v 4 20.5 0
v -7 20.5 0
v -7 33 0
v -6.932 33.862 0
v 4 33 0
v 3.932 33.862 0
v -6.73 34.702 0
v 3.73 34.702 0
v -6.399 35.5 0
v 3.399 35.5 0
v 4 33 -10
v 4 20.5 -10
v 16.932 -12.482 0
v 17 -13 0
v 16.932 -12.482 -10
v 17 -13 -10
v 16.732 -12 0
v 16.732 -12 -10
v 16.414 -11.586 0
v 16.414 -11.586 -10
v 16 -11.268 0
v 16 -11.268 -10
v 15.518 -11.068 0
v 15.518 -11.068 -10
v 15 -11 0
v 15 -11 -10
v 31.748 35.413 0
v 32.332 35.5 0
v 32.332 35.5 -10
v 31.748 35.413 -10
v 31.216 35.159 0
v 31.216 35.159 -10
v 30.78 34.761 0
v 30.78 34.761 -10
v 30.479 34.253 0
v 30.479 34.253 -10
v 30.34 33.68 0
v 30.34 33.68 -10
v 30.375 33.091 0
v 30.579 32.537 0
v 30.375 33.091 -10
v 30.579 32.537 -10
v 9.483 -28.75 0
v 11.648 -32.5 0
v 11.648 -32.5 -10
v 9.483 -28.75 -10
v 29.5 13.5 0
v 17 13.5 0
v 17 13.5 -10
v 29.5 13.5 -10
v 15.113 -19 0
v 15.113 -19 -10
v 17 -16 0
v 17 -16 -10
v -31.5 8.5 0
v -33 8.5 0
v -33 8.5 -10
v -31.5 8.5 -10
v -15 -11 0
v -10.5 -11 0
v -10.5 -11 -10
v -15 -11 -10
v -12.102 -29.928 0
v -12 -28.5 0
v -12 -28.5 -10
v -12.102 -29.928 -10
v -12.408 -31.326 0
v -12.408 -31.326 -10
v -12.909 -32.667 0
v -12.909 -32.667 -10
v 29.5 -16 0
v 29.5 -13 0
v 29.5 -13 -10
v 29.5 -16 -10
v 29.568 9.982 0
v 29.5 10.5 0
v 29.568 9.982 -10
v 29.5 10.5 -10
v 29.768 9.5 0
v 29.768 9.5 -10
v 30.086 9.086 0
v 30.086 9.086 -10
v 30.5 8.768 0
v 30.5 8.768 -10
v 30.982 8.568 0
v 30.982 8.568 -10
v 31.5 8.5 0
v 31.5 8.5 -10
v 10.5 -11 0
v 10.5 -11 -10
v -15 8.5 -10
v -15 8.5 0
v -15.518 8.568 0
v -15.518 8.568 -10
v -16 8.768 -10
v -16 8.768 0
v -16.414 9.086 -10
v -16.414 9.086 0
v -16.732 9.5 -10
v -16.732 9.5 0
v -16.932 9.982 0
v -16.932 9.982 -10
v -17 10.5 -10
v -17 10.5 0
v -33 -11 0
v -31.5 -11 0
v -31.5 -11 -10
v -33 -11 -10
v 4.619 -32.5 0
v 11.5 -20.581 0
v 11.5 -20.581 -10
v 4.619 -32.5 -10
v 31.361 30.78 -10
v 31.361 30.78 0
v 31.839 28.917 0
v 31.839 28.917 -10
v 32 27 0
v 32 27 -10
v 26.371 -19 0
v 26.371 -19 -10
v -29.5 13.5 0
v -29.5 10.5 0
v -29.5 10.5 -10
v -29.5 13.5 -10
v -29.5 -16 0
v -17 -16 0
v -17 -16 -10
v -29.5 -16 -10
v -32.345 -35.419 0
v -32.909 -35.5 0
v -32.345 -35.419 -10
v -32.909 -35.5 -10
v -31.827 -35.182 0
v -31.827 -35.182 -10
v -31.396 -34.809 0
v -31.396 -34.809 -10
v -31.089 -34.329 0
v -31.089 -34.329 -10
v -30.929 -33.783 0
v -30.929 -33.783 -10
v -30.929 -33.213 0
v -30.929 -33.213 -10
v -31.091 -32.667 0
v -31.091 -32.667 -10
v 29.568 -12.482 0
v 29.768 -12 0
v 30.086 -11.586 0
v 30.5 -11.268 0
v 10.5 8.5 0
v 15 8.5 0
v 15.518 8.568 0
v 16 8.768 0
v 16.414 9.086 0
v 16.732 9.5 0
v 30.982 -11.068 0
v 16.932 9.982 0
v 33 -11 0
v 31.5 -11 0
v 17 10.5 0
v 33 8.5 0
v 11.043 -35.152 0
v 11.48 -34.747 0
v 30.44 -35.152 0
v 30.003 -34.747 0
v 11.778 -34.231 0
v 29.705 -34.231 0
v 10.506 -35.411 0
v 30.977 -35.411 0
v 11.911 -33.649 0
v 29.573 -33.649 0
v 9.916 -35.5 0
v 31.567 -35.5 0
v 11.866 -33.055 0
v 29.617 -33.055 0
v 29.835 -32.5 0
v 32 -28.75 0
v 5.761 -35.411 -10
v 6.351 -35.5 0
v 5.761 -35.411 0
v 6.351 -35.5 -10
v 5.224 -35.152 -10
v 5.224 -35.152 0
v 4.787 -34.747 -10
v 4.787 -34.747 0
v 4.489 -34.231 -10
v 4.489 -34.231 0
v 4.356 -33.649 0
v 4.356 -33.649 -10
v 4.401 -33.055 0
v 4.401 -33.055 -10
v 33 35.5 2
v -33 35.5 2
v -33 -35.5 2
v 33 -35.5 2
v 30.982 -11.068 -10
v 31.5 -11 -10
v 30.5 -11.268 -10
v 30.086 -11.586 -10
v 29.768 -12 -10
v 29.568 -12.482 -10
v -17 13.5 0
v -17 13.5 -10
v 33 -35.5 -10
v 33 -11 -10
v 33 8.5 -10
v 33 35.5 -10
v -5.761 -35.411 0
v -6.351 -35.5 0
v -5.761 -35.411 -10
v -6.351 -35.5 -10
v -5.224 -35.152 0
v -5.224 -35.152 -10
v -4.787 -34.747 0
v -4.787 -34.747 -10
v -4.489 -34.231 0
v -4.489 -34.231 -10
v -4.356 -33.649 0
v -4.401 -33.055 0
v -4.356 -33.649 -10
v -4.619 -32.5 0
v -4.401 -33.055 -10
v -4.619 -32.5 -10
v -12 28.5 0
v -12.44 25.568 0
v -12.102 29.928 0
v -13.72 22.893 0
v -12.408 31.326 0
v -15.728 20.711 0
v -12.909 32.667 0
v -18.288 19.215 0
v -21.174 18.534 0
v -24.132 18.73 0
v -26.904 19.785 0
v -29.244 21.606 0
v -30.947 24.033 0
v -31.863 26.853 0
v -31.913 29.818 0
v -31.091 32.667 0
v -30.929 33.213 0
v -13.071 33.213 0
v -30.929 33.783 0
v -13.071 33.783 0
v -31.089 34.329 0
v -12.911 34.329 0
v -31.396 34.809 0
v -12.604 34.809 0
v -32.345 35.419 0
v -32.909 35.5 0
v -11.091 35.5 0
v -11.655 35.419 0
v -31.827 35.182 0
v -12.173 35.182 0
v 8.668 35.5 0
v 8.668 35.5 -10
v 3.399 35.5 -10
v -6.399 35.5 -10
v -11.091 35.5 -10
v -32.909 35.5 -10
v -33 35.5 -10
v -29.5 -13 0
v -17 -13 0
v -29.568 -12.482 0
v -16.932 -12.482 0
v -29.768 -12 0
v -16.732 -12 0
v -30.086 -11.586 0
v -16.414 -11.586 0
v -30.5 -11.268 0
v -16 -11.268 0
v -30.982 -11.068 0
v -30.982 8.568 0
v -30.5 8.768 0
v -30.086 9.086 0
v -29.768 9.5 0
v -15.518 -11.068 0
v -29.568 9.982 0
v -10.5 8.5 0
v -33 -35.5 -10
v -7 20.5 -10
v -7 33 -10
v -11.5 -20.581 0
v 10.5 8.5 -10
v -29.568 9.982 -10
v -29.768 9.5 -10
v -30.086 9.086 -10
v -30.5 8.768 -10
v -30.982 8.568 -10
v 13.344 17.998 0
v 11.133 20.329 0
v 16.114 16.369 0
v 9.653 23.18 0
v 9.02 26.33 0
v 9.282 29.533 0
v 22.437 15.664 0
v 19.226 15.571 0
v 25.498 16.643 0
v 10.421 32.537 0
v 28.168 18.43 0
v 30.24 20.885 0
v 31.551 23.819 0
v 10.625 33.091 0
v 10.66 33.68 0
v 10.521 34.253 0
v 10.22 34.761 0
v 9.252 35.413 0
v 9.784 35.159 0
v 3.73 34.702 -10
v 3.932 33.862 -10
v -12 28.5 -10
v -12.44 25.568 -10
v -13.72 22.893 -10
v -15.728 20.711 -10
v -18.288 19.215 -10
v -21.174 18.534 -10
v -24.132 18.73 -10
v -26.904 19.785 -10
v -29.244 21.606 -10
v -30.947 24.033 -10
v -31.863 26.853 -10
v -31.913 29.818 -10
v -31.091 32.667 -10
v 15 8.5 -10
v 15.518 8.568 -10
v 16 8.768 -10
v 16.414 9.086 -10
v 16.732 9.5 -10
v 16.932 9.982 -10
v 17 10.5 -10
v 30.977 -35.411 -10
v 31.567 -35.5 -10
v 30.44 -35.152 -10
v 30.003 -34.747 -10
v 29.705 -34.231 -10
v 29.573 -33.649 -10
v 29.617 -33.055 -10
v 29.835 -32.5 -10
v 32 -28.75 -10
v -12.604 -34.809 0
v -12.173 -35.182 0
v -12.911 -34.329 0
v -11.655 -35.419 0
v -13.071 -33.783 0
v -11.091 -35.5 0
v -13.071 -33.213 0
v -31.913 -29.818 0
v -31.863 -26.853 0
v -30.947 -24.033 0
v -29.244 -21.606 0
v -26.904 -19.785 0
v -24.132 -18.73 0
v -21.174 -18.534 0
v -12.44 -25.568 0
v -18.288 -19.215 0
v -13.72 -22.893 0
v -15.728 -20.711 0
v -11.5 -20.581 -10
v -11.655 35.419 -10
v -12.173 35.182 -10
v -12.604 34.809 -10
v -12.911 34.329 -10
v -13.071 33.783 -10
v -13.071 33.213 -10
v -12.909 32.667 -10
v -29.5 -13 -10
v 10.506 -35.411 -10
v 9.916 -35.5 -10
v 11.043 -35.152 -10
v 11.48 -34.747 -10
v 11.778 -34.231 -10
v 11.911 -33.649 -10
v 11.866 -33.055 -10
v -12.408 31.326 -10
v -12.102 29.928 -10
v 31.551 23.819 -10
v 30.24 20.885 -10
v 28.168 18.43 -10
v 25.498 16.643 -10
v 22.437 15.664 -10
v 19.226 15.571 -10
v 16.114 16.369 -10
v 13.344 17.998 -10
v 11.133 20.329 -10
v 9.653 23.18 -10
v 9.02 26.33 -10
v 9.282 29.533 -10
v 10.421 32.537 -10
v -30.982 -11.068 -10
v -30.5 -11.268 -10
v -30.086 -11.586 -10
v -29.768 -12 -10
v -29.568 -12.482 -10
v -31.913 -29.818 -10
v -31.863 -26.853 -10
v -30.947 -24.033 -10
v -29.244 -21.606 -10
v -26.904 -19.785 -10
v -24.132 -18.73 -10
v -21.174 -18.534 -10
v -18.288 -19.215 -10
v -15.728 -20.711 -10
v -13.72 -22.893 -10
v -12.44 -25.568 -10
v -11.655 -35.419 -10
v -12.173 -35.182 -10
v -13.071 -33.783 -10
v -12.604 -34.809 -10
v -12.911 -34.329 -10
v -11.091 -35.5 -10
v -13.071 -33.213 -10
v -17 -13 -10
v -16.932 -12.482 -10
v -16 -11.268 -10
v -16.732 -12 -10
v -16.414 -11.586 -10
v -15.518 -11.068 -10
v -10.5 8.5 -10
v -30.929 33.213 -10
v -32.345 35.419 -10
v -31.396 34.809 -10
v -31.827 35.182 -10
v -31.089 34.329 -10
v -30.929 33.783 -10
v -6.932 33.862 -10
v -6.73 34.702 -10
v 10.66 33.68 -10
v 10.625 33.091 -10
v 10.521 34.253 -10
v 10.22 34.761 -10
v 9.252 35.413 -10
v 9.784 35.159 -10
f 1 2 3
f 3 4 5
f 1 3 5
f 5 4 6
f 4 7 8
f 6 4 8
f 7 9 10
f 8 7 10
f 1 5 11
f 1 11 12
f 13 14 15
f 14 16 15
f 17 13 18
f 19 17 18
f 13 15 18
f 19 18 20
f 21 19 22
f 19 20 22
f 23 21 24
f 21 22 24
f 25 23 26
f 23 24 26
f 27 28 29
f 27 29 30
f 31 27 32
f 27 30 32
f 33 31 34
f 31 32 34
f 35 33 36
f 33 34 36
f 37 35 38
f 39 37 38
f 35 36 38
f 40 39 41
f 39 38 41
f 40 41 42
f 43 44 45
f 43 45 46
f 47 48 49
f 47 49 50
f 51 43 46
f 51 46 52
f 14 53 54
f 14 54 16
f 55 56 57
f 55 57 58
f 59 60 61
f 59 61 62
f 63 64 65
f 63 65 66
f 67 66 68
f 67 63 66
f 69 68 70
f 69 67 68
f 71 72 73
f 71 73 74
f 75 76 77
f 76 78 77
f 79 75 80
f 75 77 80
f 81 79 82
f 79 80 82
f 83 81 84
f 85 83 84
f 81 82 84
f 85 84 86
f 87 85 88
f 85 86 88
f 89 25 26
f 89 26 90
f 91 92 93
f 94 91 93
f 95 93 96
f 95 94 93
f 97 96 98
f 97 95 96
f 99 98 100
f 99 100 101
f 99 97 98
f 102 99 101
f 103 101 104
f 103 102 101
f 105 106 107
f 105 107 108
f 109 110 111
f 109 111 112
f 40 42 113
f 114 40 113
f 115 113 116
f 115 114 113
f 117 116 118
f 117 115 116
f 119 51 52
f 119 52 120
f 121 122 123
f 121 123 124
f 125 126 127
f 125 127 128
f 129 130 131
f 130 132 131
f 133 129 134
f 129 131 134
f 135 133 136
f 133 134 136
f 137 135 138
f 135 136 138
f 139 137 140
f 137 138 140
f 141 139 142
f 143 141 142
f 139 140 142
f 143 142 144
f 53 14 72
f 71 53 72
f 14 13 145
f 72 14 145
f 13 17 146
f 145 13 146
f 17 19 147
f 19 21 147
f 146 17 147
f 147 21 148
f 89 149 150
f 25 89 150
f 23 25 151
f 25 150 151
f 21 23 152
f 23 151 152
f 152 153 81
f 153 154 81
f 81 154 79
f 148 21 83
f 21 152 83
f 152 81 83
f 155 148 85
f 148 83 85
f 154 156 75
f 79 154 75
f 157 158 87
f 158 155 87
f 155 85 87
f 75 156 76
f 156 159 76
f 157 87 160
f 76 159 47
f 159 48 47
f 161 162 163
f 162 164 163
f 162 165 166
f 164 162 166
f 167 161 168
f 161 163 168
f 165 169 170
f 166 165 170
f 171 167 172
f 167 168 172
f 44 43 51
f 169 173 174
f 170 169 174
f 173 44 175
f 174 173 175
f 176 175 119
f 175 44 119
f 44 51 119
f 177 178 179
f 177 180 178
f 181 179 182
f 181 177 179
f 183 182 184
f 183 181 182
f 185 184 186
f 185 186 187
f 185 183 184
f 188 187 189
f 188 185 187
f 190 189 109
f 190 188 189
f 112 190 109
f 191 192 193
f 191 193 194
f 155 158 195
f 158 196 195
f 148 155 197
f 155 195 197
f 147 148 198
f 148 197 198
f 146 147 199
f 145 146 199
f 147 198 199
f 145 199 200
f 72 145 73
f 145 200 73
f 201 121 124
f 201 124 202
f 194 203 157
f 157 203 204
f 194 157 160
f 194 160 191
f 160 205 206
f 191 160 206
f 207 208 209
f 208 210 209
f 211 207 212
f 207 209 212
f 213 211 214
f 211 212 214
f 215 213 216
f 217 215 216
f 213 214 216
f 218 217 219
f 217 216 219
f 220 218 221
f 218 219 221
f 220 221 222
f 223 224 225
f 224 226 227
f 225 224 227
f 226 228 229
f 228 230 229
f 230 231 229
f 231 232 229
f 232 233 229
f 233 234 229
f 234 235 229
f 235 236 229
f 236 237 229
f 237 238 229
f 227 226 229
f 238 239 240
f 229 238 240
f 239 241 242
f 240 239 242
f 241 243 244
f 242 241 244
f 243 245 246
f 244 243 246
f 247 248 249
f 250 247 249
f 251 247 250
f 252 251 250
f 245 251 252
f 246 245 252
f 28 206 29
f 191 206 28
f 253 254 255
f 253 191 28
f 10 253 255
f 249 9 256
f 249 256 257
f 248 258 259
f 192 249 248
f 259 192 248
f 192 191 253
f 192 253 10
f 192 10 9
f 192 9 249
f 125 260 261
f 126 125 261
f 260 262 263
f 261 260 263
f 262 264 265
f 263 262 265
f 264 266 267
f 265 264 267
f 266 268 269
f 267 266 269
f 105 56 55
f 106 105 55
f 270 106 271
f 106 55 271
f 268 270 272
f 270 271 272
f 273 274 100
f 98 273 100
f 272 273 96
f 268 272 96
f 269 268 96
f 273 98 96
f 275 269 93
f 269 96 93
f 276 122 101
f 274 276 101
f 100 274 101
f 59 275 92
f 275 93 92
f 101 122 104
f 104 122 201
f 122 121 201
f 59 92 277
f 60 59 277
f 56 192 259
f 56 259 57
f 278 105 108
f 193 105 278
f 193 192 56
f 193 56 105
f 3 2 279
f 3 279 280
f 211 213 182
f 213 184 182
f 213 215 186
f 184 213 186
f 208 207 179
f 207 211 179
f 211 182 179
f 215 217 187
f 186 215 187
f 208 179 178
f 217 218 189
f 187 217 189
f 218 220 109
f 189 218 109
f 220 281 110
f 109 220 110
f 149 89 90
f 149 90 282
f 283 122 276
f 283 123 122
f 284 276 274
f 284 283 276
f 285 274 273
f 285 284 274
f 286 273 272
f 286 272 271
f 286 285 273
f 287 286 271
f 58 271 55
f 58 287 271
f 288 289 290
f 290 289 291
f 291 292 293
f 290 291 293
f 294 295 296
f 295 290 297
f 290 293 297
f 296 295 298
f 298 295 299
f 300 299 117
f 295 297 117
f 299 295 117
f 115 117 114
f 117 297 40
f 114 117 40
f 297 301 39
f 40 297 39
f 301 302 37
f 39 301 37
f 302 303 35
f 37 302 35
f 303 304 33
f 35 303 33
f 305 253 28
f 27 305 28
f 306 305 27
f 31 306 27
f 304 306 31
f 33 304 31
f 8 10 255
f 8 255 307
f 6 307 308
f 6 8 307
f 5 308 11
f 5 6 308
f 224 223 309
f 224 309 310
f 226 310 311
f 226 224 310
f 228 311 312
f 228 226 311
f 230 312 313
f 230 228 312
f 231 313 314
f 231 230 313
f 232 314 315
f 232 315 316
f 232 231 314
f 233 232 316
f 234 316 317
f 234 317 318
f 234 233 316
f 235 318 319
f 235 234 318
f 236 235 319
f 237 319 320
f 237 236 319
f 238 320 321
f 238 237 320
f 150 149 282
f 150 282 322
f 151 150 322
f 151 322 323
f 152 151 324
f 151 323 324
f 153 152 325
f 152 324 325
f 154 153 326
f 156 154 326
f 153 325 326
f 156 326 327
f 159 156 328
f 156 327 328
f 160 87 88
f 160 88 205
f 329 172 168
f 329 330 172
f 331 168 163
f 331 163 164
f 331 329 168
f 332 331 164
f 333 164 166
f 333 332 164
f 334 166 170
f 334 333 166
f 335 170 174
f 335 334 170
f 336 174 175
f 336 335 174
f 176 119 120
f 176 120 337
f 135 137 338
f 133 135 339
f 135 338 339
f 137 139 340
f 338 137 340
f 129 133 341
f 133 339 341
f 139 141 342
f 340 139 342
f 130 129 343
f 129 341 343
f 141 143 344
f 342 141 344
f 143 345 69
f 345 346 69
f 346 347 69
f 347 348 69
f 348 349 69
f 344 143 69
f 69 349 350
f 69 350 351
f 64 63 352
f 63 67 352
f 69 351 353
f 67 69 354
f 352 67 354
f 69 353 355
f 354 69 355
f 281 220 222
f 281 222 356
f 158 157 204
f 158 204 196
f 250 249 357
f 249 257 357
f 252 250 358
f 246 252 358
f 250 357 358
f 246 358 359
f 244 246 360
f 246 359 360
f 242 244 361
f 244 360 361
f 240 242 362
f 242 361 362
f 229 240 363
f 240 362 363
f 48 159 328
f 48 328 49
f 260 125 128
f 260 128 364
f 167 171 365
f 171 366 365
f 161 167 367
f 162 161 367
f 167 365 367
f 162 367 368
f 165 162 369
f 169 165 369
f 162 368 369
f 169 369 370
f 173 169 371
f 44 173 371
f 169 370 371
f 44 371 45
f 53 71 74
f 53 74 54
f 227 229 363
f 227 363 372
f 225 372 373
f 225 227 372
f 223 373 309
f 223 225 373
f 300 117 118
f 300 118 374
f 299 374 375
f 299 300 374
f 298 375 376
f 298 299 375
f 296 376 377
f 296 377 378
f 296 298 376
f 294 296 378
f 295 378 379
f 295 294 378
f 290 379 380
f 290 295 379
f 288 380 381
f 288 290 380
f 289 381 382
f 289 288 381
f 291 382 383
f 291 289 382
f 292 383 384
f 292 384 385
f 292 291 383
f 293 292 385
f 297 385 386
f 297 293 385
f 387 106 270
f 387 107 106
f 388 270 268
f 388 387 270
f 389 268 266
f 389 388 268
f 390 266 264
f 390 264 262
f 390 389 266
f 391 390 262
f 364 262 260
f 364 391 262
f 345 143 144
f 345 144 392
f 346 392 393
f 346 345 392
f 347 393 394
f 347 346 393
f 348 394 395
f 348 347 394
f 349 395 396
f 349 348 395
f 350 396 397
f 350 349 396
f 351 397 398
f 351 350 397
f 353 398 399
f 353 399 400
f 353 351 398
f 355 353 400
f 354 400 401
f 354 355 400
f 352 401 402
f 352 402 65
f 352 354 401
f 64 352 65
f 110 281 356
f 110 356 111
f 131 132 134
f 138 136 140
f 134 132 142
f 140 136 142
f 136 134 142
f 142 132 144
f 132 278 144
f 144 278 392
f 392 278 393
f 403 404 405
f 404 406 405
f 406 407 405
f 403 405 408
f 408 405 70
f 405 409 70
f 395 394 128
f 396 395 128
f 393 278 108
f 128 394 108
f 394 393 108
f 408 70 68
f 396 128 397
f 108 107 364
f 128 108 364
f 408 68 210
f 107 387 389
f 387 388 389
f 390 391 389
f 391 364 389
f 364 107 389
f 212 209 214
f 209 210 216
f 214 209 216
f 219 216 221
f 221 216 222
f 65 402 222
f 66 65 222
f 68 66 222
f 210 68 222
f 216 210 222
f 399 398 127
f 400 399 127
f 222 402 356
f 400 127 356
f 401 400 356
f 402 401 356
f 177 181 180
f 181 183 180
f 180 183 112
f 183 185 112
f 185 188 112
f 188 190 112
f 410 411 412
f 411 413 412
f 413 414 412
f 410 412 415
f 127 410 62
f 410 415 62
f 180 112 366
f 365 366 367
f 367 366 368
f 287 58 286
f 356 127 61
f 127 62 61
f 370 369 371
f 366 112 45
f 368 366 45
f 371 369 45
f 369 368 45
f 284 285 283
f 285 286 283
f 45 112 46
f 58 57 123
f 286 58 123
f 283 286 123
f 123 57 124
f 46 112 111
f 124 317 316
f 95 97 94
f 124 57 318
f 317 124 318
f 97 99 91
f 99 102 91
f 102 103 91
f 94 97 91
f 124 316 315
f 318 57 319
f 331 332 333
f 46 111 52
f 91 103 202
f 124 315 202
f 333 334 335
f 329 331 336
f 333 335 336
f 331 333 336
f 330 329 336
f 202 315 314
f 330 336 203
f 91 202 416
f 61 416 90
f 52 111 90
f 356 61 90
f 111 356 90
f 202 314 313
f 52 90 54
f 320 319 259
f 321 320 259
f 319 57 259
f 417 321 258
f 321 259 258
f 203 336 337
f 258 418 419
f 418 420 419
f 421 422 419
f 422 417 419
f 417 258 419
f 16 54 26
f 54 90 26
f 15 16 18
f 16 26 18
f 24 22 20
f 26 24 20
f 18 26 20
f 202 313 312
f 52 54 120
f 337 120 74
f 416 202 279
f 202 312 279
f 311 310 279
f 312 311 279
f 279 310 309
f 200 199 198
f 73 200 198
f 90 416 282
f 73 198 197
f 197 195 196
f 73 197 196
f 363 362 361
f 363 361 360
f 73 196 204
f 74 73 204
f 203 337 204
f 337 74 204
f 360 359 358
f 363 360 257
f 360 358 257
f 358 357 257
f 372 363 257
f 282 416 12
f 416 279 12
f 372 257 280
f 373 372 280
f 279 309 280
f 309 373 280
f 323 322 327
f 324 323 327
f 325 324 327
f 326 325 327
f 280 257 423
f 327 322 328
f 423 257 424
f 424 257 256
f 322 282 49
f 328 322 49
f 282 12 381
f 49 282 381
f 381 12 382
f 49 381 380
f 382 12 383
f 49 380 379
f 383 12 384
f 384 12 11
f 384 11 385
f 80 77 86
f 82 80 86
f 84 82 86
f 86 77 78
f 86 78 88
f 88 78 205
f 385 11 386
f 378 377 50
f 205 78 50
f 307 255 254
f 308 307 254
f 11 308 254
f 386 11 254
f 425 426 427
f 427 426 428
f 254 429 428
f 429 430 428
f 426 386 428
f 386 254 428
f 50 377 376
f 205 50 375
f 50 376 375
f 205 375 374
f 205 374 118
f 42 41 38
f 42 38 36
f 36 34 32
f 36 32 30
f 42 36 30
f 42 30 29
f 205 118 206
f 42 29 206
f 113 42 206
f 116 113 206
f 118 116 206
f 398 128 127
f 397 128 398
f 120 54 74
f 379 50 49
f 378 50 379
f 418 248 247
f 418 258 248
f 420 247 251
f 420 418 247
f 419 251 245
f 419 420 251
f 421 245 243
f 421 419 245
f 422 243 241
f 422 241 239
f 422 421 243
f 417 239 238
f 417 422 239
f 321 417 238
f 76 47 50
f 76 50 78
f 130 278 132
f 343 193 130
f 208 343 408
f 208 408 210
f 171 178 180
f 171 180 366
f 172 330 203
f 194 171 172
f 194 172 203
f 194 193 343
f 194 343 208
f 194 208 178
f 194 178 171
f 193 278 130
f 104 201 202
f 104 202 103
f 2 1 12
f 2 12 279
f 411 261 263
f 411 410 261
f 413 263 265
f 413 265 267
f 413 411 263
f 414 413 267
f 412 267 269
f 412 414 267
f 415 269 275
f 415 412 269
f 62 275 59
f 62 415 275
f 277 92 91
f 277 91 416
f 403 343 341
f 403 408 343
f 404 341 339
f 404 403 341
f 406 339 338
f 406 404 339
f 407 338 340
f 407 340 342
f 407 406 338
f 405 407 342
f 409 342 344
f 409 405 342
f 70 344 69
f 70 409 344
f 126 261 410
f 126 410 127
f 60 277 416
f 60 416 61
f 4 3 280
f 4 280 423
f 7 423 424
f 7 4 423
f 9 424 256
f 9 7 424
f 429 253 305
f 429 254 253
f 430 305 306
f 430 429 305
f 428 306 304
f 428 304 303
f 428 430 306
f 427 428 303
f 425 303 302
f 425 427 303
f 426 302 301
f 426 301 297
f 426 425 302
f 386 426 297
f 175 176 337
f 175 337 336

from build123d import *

# Parameters (mm, degrees)
F1_W     = 6.5
F1_H     = 19.5
F1_W_2   = 12.5
F1_H_2   = 5
F1_W_3   = 3.5
F2_DEPTH = 2
F3_DEPTH = 10
F4_R     = 2


# Not quite as in the source:
# - a feature names something its author has since deleted; it is built from what else it names


with BuildPart() as f2:
    # F1 (on Top) → F2 (new body)
    with BuildSketch(Plane.XY):
        with BuildLine():
            Line((-29.1414284285, 35.5), (-33, 35.5))
            Line((-33, 35.5), (-33, 8.5))
            Line((-33, 8.5), (-29.5, 8.5))
            Line((-29.5, 8.5), (-29.5, 13.5))
            Line((-29.5, 13.5), (-17, 13.5))
            Line((-17, 13.5), (-17, 8.5))
            Line((-17, 8.5), (-10.5, 8.5))
            Line((-10.5, 8.5), (-10.5, -11))
            Line((-10.5, -11), (-17, -11))
            Line((-17, -11), (-17, -16))
            Line((-17, -16), (-29.5, -16))
            Line((-29.5, -16), (-29.5, -11))
            Line((-29.5, -11), (-33, -11))
            Line((-33, -11), (-33, -35.5))
            Line((-33, -35.5), (-29.1414284285, -35.5))
            ThreePointArc((-29.1414284285, -35.5), (-25.7805896177, -19.2421848073), (-12, -28.5))
            ThreePointArc((-12, -28.5), (-12.7421848073, -32.2805896177), (-14.8585715715, -35.5))
            Line((-14.8585715715, -35.5), (-2.8867513459, -35.5))
            Line((-2.8867513459, -35.5), (-11.5, -20.581415713))
            Line((-11.5, -20.581415713), (11.5, -20.581415713))
            Line((11.5, -20.581415713), (2.8867513459, -35.5))
            Line((2.8867513459, -35.5), (13.3804538186, -35.5))
            Line((13.3804538186, -35.5), (9.4833395016, -28.75))
            Line((9.4833395016, -28.75), (15.1125046262, -19))
            Line((15.1125046262, -19), (26.3708348754, -19))
            Line((26.3708348754, -19), (32, -28.75))
            Line((32, -28.75), (28.102885683, -35.5))
            Line((28.102885683, -35.5), (33, -35.5))
            Line((33, -35.5), (33, -11))
            Line((33, -11), (29.5, -11))
            Line((29.5, -11), (29.5, -16))
            Line((29.5, -16), (17, -16))
            Line((17, -16), (17, -11))
            Line((17, -11), (10.5, -11))
            Line((10.5, -11), (10.5, 8.5))
            Line((10.5, 8.5), (17, 8.5))
            Line((17, 8.5), (17, 13.5))
            Line((17, 13.5), (29.5, 13.5))
            Line((29.5, 13.5), (29.5, 8.5))
            Line((29.5, 8.5), (33, 8.5))
            Line((33, 8.5), (33, 35.5))
            Line((33, 35.5), (28.2459666924, 35.5))
            ThreePointArc((28.2459666924, 35.5), (31.0197104752, 31.6460404129), (32, 27))
            ThreePointArc((32, 27), (15.8539595871, 16.4802895248), (12.7540333076, 35.5))
            Line((12.7540333076, 35.5), (3.3989794856, 35.5))
            ThreePointArc((3.3989794856, 35.5), (3.8476343915, 34.2856151892), (4, 33))
            Line((4, 33), (4, 20.5))
            Line((4, 20.5), (-7, 20.5))
            Line((-7, 20.5), (-7, 33))
            ThreePointArc((-7, 33), (-6.8476343915, 34.2856151892), (-6.3989794856, 35.5))
            Line((-6.3989794856, 35.5), (-14.8585715715, 35.5))
            ThreePointArc((-14.8585715715, 35.5), (-12.7421848073, 32.2805896177), (-12, 28.5))
            ThreePointArc((-12, 28.5), (-25.7805896177, 19.2421848073), (-29.1414284285, 35.5))
        make_face()
        with BuildLine():
            Line((-14.8585715715, 35.5), (-29.1414284285, 35.5))
            ThreePointArc((-29.1414284285, 35.5), (-25.7805896177, 19.2421848073), (-12, 28.5))
            ThreePointArc((-12, 28.5), (-12.7421848073, 32.2805896177), (-14.8585715715, 35.5))
        make_face()
        with BuildLine():
            ThreePointArc((-12, -28.5), (-25.7805896177, -19.2421848073), (-29.1414284285, -35.5))
            Line((-29.1414284285, -35.5), (-14.8585715715, -35.5))
            ThreePointArc((-14.8585715715, -35.5), (-12.7421848073, -32.2805896177), (-12, -28.5))
        make_face()
        Polygon((-11.5, -20.581415713), (-2.8867513459, -35.5), (2.8867513459, -35.5), (11.5, -20.581415713), align=None)
        with BuildLine():
            Line((28.2459666924, 35.5), (12.7540333076, 35.5))
            ThreePointArc((12.7540333076, 35.5), (15.8539595871, 16.4802895248), (32, 27))
            ThreePointArc((32, 27), (31.0197104752, 31.6460404129), (28.2459666924, 35.5))
        make_face()
        with BuildLine():
            Line((3.3989794856, 35.5), (-6.3989794856, 35.5))
            ThreePointArc((-6.3989794856, 35.5), (-6.8476343915, 34.2856151892), (-7, 33))
            Line((-7, 33), (4, 33))
            ThreePointArc((4, 33), (3.8476343915, 34.2856151892), (3.3989794856, 35.5))
        make_face()
        with BuildLine():
            Line((4, 33), (-7, 33))
            ThreePointArc((-7, 33), (-1.5, 27.5), (4, 33))
        make_face()
        with BuildLine():
            ThreePointArc((4, 33), (-1.5, 27.5), (-7, 33))
            Line((-7, 33), (-7, 20.5))
            Line((-7, 20.5), (4, 20.5))
            Line((4, 20.5), (4, 33))
        make_face()
        with Locations((13.75, -1.25)):
            Rectangle(F1_W, F1_H)
        with Locations((23.25, 11)):
            Rectangle(F1_W_2, F1_H_2)
        with Locations((23.25, -1.25)):
            Rectangle(F1_W_2, F1_H)
        with Locations((23.25, -13.5)):
            Rectangle(F1_W_2, F1_H_2)
        Polygon((9.4833395016, -28.75), (13.3804538186, -35.5), (28.102885683, -35.5), (32, -28.75), (26.3708348754, -19), (15.1125046262, -19), align=None)
        with Locations((31.25, -1.25)):
            Rectangle(F1_W_3, F1_H)
        with Locations((-31.25, -1.25)):
            Rectangle(F1_W_3, F1_H)
        with Locations((-23.25, -1.25)):
            Rectangle(F1_W_2, F1_H)
        with Locations((-13.75, -1.25)):
            Rectangle(F1_W, F1_H)
        with Locations((-23.25, 11)):
            Rectangle(F1_W_2, F1_H_2)
        with Locations((-23.25, -13.5)):
            Rectangle(F1_W_2, F1_H_2)
    extrude(amount=F2_DEPTH)

    # F1 (on Top) → F3 (join)
    with BuildSketch(Plane.XY):
        with BuildLine():
            Line((-29.1414284285, 35.5), (-33, 35.5))
            Line((-33, 35.5), (-33, 8.5))
            Line((-33, 8.5), (-29.5, 8.5))
            Line((-29.5, 8.5), (-29.5, 13.5))
            Line((-29.5, 13.5), (-17, 13.5))
            Line((-17, 13.5), (-17, 8.5))
            Line((-17, 8.5), (-10.5, 8.5))
            Line((-10.5, 8.5), (-10.5, -11))
            Line((-10.5, -11), (-17, -11))
            Line((-17, -11), (-17, -16))
            Line((-17, -16), (-29.5, -16))
            Line((-29.5, -16), (-29.5, -11))
            Line((-29.5, -11), (-33, -11))
            Line((-33, -11), (-33, -35.5))
            Line((-33, -35.5), (-29.1414284285, -35.5))
            ThreePointArc((-29.1414284285, -35.5), (-25.7805896177, -19.2421848073), (-12, -28.5))
            ThreePointArc((-12, -28.5), (-12.7421848073, -32.2805896177), (-14.8585715715, -35.5))
            Line((-14.8585715715, -35.5), (-2.8867513459, -35.5))
            Line((-2.8867513459, -35.5), (-11.5, -20.581415713))
            Line((-11.5, -20.581415713), (11.5, -20.581415713))
            Line((11.5, -20.581415713), (2.8867513459, -35.5))
            Line((2.8867513459, -35.5), (13.3804538186, -35.5))
            Line((13.3804538186, -35.5), (9.4833395016, -28.75))
            Line((9.4833395016, -28.75), (15.1125046262, -19))
            Line((15.1125046262, -19), (26.3708348754, -19))
            Line((26.3708348754, -19), (32, -28.75))
            Line((32, -28.75), (28.102885683, -35.5))
            Line((28.102885683, -35.5), (33, -35.5))
            Line((33, -35.5), (33, -11))
            Line((33, -11), (29.5, -11))
            Line((29.5, -11), (29.5, -16))
            Line((29.5, -16), (17, -16))
            Line((17, -16), (17, -11))
            Line((17, -11), (10.5, -11))
            Line((10.5, -11), (10.5, 8.5))
            Line((10.5, 8.5), (17, 8.5))
            Line((17, 8.5), (17, 13.5))
            Line((17, 13.5), (29.5, 13.5))
            Line((29.5, 13.5), (29.5, 8.5))
            Line((29.5, 8.5), (33, 8.5))
            Line((33, 8.5), (33, 35.5))
            Line((33, 35.5), (28.2459666924, 35.5))
            ThreePointArc((28.2459666924, 35.5), (31.0197104752, 31.6460404129), (32, 27))
            ThreePointArc((32, 27), (15.8539595871, 16.4802895248), (12.7540333076, 35.5))
            Line((12.7540333076, 35.5), (3.3989794856, 35.5))
            ThreePointArc((3.3989794856, 35.5), (3.8476343915, 34.2856151892), (4, 33))
            Line((4, 33), (4, 20.5))
            Line((4, 20.5), (-7, 20.5))
            Line((-7, 20.5), (-7, 33))
            ThreePointArc((-7, 33), (-6.8476343915, 34.2856151892), (-6.3989794856, 35.5))
            Line((-6.3989794856, 35.5), (-14.8585715715, 35.5))
            ThreePointArc((-14.8585715715, 35.5), (-12.7421848073, 32.2805896177), (-12, 28.5))
            ThreePointArc((-12, 28.5), (-25.7805896177, 19.2421848073), (-29.1414284285, 35.5))
        make_face()
    extrude(amount=-F3_DEPTH)

    # F4
    f4_edges = [f2.edges().sort_by_distance(p)[0] for p in [
        (-29.5, -11, -5),
        (-29.5, 8.5, -5),
        (-17, -11, -5),
        (-17, 8.5, -5),
        (17, -11, -5),
        (17, 8.5, -5),
        (29.5, -11, -5),
        (29.5, 8.5, -5),
        (-2.886751, -35.5, -5),
        (2.886751, -35.5, -5),
        (12.754033, 35.5, -5),
        (28.245967, 35.5, -5),
        (-29.141428, 35.5, -5),
        (-14.858572, 35.5, -5),
        (-29.141428, -35.5, -5),
        (-14.858572, -35.5, -5),
        (13.380454, -35.5, -5),
        (28.102886, -35.5, -5),
    ]]
    fillet(f4_edges, radius=F4_R)


solid = f2.part
